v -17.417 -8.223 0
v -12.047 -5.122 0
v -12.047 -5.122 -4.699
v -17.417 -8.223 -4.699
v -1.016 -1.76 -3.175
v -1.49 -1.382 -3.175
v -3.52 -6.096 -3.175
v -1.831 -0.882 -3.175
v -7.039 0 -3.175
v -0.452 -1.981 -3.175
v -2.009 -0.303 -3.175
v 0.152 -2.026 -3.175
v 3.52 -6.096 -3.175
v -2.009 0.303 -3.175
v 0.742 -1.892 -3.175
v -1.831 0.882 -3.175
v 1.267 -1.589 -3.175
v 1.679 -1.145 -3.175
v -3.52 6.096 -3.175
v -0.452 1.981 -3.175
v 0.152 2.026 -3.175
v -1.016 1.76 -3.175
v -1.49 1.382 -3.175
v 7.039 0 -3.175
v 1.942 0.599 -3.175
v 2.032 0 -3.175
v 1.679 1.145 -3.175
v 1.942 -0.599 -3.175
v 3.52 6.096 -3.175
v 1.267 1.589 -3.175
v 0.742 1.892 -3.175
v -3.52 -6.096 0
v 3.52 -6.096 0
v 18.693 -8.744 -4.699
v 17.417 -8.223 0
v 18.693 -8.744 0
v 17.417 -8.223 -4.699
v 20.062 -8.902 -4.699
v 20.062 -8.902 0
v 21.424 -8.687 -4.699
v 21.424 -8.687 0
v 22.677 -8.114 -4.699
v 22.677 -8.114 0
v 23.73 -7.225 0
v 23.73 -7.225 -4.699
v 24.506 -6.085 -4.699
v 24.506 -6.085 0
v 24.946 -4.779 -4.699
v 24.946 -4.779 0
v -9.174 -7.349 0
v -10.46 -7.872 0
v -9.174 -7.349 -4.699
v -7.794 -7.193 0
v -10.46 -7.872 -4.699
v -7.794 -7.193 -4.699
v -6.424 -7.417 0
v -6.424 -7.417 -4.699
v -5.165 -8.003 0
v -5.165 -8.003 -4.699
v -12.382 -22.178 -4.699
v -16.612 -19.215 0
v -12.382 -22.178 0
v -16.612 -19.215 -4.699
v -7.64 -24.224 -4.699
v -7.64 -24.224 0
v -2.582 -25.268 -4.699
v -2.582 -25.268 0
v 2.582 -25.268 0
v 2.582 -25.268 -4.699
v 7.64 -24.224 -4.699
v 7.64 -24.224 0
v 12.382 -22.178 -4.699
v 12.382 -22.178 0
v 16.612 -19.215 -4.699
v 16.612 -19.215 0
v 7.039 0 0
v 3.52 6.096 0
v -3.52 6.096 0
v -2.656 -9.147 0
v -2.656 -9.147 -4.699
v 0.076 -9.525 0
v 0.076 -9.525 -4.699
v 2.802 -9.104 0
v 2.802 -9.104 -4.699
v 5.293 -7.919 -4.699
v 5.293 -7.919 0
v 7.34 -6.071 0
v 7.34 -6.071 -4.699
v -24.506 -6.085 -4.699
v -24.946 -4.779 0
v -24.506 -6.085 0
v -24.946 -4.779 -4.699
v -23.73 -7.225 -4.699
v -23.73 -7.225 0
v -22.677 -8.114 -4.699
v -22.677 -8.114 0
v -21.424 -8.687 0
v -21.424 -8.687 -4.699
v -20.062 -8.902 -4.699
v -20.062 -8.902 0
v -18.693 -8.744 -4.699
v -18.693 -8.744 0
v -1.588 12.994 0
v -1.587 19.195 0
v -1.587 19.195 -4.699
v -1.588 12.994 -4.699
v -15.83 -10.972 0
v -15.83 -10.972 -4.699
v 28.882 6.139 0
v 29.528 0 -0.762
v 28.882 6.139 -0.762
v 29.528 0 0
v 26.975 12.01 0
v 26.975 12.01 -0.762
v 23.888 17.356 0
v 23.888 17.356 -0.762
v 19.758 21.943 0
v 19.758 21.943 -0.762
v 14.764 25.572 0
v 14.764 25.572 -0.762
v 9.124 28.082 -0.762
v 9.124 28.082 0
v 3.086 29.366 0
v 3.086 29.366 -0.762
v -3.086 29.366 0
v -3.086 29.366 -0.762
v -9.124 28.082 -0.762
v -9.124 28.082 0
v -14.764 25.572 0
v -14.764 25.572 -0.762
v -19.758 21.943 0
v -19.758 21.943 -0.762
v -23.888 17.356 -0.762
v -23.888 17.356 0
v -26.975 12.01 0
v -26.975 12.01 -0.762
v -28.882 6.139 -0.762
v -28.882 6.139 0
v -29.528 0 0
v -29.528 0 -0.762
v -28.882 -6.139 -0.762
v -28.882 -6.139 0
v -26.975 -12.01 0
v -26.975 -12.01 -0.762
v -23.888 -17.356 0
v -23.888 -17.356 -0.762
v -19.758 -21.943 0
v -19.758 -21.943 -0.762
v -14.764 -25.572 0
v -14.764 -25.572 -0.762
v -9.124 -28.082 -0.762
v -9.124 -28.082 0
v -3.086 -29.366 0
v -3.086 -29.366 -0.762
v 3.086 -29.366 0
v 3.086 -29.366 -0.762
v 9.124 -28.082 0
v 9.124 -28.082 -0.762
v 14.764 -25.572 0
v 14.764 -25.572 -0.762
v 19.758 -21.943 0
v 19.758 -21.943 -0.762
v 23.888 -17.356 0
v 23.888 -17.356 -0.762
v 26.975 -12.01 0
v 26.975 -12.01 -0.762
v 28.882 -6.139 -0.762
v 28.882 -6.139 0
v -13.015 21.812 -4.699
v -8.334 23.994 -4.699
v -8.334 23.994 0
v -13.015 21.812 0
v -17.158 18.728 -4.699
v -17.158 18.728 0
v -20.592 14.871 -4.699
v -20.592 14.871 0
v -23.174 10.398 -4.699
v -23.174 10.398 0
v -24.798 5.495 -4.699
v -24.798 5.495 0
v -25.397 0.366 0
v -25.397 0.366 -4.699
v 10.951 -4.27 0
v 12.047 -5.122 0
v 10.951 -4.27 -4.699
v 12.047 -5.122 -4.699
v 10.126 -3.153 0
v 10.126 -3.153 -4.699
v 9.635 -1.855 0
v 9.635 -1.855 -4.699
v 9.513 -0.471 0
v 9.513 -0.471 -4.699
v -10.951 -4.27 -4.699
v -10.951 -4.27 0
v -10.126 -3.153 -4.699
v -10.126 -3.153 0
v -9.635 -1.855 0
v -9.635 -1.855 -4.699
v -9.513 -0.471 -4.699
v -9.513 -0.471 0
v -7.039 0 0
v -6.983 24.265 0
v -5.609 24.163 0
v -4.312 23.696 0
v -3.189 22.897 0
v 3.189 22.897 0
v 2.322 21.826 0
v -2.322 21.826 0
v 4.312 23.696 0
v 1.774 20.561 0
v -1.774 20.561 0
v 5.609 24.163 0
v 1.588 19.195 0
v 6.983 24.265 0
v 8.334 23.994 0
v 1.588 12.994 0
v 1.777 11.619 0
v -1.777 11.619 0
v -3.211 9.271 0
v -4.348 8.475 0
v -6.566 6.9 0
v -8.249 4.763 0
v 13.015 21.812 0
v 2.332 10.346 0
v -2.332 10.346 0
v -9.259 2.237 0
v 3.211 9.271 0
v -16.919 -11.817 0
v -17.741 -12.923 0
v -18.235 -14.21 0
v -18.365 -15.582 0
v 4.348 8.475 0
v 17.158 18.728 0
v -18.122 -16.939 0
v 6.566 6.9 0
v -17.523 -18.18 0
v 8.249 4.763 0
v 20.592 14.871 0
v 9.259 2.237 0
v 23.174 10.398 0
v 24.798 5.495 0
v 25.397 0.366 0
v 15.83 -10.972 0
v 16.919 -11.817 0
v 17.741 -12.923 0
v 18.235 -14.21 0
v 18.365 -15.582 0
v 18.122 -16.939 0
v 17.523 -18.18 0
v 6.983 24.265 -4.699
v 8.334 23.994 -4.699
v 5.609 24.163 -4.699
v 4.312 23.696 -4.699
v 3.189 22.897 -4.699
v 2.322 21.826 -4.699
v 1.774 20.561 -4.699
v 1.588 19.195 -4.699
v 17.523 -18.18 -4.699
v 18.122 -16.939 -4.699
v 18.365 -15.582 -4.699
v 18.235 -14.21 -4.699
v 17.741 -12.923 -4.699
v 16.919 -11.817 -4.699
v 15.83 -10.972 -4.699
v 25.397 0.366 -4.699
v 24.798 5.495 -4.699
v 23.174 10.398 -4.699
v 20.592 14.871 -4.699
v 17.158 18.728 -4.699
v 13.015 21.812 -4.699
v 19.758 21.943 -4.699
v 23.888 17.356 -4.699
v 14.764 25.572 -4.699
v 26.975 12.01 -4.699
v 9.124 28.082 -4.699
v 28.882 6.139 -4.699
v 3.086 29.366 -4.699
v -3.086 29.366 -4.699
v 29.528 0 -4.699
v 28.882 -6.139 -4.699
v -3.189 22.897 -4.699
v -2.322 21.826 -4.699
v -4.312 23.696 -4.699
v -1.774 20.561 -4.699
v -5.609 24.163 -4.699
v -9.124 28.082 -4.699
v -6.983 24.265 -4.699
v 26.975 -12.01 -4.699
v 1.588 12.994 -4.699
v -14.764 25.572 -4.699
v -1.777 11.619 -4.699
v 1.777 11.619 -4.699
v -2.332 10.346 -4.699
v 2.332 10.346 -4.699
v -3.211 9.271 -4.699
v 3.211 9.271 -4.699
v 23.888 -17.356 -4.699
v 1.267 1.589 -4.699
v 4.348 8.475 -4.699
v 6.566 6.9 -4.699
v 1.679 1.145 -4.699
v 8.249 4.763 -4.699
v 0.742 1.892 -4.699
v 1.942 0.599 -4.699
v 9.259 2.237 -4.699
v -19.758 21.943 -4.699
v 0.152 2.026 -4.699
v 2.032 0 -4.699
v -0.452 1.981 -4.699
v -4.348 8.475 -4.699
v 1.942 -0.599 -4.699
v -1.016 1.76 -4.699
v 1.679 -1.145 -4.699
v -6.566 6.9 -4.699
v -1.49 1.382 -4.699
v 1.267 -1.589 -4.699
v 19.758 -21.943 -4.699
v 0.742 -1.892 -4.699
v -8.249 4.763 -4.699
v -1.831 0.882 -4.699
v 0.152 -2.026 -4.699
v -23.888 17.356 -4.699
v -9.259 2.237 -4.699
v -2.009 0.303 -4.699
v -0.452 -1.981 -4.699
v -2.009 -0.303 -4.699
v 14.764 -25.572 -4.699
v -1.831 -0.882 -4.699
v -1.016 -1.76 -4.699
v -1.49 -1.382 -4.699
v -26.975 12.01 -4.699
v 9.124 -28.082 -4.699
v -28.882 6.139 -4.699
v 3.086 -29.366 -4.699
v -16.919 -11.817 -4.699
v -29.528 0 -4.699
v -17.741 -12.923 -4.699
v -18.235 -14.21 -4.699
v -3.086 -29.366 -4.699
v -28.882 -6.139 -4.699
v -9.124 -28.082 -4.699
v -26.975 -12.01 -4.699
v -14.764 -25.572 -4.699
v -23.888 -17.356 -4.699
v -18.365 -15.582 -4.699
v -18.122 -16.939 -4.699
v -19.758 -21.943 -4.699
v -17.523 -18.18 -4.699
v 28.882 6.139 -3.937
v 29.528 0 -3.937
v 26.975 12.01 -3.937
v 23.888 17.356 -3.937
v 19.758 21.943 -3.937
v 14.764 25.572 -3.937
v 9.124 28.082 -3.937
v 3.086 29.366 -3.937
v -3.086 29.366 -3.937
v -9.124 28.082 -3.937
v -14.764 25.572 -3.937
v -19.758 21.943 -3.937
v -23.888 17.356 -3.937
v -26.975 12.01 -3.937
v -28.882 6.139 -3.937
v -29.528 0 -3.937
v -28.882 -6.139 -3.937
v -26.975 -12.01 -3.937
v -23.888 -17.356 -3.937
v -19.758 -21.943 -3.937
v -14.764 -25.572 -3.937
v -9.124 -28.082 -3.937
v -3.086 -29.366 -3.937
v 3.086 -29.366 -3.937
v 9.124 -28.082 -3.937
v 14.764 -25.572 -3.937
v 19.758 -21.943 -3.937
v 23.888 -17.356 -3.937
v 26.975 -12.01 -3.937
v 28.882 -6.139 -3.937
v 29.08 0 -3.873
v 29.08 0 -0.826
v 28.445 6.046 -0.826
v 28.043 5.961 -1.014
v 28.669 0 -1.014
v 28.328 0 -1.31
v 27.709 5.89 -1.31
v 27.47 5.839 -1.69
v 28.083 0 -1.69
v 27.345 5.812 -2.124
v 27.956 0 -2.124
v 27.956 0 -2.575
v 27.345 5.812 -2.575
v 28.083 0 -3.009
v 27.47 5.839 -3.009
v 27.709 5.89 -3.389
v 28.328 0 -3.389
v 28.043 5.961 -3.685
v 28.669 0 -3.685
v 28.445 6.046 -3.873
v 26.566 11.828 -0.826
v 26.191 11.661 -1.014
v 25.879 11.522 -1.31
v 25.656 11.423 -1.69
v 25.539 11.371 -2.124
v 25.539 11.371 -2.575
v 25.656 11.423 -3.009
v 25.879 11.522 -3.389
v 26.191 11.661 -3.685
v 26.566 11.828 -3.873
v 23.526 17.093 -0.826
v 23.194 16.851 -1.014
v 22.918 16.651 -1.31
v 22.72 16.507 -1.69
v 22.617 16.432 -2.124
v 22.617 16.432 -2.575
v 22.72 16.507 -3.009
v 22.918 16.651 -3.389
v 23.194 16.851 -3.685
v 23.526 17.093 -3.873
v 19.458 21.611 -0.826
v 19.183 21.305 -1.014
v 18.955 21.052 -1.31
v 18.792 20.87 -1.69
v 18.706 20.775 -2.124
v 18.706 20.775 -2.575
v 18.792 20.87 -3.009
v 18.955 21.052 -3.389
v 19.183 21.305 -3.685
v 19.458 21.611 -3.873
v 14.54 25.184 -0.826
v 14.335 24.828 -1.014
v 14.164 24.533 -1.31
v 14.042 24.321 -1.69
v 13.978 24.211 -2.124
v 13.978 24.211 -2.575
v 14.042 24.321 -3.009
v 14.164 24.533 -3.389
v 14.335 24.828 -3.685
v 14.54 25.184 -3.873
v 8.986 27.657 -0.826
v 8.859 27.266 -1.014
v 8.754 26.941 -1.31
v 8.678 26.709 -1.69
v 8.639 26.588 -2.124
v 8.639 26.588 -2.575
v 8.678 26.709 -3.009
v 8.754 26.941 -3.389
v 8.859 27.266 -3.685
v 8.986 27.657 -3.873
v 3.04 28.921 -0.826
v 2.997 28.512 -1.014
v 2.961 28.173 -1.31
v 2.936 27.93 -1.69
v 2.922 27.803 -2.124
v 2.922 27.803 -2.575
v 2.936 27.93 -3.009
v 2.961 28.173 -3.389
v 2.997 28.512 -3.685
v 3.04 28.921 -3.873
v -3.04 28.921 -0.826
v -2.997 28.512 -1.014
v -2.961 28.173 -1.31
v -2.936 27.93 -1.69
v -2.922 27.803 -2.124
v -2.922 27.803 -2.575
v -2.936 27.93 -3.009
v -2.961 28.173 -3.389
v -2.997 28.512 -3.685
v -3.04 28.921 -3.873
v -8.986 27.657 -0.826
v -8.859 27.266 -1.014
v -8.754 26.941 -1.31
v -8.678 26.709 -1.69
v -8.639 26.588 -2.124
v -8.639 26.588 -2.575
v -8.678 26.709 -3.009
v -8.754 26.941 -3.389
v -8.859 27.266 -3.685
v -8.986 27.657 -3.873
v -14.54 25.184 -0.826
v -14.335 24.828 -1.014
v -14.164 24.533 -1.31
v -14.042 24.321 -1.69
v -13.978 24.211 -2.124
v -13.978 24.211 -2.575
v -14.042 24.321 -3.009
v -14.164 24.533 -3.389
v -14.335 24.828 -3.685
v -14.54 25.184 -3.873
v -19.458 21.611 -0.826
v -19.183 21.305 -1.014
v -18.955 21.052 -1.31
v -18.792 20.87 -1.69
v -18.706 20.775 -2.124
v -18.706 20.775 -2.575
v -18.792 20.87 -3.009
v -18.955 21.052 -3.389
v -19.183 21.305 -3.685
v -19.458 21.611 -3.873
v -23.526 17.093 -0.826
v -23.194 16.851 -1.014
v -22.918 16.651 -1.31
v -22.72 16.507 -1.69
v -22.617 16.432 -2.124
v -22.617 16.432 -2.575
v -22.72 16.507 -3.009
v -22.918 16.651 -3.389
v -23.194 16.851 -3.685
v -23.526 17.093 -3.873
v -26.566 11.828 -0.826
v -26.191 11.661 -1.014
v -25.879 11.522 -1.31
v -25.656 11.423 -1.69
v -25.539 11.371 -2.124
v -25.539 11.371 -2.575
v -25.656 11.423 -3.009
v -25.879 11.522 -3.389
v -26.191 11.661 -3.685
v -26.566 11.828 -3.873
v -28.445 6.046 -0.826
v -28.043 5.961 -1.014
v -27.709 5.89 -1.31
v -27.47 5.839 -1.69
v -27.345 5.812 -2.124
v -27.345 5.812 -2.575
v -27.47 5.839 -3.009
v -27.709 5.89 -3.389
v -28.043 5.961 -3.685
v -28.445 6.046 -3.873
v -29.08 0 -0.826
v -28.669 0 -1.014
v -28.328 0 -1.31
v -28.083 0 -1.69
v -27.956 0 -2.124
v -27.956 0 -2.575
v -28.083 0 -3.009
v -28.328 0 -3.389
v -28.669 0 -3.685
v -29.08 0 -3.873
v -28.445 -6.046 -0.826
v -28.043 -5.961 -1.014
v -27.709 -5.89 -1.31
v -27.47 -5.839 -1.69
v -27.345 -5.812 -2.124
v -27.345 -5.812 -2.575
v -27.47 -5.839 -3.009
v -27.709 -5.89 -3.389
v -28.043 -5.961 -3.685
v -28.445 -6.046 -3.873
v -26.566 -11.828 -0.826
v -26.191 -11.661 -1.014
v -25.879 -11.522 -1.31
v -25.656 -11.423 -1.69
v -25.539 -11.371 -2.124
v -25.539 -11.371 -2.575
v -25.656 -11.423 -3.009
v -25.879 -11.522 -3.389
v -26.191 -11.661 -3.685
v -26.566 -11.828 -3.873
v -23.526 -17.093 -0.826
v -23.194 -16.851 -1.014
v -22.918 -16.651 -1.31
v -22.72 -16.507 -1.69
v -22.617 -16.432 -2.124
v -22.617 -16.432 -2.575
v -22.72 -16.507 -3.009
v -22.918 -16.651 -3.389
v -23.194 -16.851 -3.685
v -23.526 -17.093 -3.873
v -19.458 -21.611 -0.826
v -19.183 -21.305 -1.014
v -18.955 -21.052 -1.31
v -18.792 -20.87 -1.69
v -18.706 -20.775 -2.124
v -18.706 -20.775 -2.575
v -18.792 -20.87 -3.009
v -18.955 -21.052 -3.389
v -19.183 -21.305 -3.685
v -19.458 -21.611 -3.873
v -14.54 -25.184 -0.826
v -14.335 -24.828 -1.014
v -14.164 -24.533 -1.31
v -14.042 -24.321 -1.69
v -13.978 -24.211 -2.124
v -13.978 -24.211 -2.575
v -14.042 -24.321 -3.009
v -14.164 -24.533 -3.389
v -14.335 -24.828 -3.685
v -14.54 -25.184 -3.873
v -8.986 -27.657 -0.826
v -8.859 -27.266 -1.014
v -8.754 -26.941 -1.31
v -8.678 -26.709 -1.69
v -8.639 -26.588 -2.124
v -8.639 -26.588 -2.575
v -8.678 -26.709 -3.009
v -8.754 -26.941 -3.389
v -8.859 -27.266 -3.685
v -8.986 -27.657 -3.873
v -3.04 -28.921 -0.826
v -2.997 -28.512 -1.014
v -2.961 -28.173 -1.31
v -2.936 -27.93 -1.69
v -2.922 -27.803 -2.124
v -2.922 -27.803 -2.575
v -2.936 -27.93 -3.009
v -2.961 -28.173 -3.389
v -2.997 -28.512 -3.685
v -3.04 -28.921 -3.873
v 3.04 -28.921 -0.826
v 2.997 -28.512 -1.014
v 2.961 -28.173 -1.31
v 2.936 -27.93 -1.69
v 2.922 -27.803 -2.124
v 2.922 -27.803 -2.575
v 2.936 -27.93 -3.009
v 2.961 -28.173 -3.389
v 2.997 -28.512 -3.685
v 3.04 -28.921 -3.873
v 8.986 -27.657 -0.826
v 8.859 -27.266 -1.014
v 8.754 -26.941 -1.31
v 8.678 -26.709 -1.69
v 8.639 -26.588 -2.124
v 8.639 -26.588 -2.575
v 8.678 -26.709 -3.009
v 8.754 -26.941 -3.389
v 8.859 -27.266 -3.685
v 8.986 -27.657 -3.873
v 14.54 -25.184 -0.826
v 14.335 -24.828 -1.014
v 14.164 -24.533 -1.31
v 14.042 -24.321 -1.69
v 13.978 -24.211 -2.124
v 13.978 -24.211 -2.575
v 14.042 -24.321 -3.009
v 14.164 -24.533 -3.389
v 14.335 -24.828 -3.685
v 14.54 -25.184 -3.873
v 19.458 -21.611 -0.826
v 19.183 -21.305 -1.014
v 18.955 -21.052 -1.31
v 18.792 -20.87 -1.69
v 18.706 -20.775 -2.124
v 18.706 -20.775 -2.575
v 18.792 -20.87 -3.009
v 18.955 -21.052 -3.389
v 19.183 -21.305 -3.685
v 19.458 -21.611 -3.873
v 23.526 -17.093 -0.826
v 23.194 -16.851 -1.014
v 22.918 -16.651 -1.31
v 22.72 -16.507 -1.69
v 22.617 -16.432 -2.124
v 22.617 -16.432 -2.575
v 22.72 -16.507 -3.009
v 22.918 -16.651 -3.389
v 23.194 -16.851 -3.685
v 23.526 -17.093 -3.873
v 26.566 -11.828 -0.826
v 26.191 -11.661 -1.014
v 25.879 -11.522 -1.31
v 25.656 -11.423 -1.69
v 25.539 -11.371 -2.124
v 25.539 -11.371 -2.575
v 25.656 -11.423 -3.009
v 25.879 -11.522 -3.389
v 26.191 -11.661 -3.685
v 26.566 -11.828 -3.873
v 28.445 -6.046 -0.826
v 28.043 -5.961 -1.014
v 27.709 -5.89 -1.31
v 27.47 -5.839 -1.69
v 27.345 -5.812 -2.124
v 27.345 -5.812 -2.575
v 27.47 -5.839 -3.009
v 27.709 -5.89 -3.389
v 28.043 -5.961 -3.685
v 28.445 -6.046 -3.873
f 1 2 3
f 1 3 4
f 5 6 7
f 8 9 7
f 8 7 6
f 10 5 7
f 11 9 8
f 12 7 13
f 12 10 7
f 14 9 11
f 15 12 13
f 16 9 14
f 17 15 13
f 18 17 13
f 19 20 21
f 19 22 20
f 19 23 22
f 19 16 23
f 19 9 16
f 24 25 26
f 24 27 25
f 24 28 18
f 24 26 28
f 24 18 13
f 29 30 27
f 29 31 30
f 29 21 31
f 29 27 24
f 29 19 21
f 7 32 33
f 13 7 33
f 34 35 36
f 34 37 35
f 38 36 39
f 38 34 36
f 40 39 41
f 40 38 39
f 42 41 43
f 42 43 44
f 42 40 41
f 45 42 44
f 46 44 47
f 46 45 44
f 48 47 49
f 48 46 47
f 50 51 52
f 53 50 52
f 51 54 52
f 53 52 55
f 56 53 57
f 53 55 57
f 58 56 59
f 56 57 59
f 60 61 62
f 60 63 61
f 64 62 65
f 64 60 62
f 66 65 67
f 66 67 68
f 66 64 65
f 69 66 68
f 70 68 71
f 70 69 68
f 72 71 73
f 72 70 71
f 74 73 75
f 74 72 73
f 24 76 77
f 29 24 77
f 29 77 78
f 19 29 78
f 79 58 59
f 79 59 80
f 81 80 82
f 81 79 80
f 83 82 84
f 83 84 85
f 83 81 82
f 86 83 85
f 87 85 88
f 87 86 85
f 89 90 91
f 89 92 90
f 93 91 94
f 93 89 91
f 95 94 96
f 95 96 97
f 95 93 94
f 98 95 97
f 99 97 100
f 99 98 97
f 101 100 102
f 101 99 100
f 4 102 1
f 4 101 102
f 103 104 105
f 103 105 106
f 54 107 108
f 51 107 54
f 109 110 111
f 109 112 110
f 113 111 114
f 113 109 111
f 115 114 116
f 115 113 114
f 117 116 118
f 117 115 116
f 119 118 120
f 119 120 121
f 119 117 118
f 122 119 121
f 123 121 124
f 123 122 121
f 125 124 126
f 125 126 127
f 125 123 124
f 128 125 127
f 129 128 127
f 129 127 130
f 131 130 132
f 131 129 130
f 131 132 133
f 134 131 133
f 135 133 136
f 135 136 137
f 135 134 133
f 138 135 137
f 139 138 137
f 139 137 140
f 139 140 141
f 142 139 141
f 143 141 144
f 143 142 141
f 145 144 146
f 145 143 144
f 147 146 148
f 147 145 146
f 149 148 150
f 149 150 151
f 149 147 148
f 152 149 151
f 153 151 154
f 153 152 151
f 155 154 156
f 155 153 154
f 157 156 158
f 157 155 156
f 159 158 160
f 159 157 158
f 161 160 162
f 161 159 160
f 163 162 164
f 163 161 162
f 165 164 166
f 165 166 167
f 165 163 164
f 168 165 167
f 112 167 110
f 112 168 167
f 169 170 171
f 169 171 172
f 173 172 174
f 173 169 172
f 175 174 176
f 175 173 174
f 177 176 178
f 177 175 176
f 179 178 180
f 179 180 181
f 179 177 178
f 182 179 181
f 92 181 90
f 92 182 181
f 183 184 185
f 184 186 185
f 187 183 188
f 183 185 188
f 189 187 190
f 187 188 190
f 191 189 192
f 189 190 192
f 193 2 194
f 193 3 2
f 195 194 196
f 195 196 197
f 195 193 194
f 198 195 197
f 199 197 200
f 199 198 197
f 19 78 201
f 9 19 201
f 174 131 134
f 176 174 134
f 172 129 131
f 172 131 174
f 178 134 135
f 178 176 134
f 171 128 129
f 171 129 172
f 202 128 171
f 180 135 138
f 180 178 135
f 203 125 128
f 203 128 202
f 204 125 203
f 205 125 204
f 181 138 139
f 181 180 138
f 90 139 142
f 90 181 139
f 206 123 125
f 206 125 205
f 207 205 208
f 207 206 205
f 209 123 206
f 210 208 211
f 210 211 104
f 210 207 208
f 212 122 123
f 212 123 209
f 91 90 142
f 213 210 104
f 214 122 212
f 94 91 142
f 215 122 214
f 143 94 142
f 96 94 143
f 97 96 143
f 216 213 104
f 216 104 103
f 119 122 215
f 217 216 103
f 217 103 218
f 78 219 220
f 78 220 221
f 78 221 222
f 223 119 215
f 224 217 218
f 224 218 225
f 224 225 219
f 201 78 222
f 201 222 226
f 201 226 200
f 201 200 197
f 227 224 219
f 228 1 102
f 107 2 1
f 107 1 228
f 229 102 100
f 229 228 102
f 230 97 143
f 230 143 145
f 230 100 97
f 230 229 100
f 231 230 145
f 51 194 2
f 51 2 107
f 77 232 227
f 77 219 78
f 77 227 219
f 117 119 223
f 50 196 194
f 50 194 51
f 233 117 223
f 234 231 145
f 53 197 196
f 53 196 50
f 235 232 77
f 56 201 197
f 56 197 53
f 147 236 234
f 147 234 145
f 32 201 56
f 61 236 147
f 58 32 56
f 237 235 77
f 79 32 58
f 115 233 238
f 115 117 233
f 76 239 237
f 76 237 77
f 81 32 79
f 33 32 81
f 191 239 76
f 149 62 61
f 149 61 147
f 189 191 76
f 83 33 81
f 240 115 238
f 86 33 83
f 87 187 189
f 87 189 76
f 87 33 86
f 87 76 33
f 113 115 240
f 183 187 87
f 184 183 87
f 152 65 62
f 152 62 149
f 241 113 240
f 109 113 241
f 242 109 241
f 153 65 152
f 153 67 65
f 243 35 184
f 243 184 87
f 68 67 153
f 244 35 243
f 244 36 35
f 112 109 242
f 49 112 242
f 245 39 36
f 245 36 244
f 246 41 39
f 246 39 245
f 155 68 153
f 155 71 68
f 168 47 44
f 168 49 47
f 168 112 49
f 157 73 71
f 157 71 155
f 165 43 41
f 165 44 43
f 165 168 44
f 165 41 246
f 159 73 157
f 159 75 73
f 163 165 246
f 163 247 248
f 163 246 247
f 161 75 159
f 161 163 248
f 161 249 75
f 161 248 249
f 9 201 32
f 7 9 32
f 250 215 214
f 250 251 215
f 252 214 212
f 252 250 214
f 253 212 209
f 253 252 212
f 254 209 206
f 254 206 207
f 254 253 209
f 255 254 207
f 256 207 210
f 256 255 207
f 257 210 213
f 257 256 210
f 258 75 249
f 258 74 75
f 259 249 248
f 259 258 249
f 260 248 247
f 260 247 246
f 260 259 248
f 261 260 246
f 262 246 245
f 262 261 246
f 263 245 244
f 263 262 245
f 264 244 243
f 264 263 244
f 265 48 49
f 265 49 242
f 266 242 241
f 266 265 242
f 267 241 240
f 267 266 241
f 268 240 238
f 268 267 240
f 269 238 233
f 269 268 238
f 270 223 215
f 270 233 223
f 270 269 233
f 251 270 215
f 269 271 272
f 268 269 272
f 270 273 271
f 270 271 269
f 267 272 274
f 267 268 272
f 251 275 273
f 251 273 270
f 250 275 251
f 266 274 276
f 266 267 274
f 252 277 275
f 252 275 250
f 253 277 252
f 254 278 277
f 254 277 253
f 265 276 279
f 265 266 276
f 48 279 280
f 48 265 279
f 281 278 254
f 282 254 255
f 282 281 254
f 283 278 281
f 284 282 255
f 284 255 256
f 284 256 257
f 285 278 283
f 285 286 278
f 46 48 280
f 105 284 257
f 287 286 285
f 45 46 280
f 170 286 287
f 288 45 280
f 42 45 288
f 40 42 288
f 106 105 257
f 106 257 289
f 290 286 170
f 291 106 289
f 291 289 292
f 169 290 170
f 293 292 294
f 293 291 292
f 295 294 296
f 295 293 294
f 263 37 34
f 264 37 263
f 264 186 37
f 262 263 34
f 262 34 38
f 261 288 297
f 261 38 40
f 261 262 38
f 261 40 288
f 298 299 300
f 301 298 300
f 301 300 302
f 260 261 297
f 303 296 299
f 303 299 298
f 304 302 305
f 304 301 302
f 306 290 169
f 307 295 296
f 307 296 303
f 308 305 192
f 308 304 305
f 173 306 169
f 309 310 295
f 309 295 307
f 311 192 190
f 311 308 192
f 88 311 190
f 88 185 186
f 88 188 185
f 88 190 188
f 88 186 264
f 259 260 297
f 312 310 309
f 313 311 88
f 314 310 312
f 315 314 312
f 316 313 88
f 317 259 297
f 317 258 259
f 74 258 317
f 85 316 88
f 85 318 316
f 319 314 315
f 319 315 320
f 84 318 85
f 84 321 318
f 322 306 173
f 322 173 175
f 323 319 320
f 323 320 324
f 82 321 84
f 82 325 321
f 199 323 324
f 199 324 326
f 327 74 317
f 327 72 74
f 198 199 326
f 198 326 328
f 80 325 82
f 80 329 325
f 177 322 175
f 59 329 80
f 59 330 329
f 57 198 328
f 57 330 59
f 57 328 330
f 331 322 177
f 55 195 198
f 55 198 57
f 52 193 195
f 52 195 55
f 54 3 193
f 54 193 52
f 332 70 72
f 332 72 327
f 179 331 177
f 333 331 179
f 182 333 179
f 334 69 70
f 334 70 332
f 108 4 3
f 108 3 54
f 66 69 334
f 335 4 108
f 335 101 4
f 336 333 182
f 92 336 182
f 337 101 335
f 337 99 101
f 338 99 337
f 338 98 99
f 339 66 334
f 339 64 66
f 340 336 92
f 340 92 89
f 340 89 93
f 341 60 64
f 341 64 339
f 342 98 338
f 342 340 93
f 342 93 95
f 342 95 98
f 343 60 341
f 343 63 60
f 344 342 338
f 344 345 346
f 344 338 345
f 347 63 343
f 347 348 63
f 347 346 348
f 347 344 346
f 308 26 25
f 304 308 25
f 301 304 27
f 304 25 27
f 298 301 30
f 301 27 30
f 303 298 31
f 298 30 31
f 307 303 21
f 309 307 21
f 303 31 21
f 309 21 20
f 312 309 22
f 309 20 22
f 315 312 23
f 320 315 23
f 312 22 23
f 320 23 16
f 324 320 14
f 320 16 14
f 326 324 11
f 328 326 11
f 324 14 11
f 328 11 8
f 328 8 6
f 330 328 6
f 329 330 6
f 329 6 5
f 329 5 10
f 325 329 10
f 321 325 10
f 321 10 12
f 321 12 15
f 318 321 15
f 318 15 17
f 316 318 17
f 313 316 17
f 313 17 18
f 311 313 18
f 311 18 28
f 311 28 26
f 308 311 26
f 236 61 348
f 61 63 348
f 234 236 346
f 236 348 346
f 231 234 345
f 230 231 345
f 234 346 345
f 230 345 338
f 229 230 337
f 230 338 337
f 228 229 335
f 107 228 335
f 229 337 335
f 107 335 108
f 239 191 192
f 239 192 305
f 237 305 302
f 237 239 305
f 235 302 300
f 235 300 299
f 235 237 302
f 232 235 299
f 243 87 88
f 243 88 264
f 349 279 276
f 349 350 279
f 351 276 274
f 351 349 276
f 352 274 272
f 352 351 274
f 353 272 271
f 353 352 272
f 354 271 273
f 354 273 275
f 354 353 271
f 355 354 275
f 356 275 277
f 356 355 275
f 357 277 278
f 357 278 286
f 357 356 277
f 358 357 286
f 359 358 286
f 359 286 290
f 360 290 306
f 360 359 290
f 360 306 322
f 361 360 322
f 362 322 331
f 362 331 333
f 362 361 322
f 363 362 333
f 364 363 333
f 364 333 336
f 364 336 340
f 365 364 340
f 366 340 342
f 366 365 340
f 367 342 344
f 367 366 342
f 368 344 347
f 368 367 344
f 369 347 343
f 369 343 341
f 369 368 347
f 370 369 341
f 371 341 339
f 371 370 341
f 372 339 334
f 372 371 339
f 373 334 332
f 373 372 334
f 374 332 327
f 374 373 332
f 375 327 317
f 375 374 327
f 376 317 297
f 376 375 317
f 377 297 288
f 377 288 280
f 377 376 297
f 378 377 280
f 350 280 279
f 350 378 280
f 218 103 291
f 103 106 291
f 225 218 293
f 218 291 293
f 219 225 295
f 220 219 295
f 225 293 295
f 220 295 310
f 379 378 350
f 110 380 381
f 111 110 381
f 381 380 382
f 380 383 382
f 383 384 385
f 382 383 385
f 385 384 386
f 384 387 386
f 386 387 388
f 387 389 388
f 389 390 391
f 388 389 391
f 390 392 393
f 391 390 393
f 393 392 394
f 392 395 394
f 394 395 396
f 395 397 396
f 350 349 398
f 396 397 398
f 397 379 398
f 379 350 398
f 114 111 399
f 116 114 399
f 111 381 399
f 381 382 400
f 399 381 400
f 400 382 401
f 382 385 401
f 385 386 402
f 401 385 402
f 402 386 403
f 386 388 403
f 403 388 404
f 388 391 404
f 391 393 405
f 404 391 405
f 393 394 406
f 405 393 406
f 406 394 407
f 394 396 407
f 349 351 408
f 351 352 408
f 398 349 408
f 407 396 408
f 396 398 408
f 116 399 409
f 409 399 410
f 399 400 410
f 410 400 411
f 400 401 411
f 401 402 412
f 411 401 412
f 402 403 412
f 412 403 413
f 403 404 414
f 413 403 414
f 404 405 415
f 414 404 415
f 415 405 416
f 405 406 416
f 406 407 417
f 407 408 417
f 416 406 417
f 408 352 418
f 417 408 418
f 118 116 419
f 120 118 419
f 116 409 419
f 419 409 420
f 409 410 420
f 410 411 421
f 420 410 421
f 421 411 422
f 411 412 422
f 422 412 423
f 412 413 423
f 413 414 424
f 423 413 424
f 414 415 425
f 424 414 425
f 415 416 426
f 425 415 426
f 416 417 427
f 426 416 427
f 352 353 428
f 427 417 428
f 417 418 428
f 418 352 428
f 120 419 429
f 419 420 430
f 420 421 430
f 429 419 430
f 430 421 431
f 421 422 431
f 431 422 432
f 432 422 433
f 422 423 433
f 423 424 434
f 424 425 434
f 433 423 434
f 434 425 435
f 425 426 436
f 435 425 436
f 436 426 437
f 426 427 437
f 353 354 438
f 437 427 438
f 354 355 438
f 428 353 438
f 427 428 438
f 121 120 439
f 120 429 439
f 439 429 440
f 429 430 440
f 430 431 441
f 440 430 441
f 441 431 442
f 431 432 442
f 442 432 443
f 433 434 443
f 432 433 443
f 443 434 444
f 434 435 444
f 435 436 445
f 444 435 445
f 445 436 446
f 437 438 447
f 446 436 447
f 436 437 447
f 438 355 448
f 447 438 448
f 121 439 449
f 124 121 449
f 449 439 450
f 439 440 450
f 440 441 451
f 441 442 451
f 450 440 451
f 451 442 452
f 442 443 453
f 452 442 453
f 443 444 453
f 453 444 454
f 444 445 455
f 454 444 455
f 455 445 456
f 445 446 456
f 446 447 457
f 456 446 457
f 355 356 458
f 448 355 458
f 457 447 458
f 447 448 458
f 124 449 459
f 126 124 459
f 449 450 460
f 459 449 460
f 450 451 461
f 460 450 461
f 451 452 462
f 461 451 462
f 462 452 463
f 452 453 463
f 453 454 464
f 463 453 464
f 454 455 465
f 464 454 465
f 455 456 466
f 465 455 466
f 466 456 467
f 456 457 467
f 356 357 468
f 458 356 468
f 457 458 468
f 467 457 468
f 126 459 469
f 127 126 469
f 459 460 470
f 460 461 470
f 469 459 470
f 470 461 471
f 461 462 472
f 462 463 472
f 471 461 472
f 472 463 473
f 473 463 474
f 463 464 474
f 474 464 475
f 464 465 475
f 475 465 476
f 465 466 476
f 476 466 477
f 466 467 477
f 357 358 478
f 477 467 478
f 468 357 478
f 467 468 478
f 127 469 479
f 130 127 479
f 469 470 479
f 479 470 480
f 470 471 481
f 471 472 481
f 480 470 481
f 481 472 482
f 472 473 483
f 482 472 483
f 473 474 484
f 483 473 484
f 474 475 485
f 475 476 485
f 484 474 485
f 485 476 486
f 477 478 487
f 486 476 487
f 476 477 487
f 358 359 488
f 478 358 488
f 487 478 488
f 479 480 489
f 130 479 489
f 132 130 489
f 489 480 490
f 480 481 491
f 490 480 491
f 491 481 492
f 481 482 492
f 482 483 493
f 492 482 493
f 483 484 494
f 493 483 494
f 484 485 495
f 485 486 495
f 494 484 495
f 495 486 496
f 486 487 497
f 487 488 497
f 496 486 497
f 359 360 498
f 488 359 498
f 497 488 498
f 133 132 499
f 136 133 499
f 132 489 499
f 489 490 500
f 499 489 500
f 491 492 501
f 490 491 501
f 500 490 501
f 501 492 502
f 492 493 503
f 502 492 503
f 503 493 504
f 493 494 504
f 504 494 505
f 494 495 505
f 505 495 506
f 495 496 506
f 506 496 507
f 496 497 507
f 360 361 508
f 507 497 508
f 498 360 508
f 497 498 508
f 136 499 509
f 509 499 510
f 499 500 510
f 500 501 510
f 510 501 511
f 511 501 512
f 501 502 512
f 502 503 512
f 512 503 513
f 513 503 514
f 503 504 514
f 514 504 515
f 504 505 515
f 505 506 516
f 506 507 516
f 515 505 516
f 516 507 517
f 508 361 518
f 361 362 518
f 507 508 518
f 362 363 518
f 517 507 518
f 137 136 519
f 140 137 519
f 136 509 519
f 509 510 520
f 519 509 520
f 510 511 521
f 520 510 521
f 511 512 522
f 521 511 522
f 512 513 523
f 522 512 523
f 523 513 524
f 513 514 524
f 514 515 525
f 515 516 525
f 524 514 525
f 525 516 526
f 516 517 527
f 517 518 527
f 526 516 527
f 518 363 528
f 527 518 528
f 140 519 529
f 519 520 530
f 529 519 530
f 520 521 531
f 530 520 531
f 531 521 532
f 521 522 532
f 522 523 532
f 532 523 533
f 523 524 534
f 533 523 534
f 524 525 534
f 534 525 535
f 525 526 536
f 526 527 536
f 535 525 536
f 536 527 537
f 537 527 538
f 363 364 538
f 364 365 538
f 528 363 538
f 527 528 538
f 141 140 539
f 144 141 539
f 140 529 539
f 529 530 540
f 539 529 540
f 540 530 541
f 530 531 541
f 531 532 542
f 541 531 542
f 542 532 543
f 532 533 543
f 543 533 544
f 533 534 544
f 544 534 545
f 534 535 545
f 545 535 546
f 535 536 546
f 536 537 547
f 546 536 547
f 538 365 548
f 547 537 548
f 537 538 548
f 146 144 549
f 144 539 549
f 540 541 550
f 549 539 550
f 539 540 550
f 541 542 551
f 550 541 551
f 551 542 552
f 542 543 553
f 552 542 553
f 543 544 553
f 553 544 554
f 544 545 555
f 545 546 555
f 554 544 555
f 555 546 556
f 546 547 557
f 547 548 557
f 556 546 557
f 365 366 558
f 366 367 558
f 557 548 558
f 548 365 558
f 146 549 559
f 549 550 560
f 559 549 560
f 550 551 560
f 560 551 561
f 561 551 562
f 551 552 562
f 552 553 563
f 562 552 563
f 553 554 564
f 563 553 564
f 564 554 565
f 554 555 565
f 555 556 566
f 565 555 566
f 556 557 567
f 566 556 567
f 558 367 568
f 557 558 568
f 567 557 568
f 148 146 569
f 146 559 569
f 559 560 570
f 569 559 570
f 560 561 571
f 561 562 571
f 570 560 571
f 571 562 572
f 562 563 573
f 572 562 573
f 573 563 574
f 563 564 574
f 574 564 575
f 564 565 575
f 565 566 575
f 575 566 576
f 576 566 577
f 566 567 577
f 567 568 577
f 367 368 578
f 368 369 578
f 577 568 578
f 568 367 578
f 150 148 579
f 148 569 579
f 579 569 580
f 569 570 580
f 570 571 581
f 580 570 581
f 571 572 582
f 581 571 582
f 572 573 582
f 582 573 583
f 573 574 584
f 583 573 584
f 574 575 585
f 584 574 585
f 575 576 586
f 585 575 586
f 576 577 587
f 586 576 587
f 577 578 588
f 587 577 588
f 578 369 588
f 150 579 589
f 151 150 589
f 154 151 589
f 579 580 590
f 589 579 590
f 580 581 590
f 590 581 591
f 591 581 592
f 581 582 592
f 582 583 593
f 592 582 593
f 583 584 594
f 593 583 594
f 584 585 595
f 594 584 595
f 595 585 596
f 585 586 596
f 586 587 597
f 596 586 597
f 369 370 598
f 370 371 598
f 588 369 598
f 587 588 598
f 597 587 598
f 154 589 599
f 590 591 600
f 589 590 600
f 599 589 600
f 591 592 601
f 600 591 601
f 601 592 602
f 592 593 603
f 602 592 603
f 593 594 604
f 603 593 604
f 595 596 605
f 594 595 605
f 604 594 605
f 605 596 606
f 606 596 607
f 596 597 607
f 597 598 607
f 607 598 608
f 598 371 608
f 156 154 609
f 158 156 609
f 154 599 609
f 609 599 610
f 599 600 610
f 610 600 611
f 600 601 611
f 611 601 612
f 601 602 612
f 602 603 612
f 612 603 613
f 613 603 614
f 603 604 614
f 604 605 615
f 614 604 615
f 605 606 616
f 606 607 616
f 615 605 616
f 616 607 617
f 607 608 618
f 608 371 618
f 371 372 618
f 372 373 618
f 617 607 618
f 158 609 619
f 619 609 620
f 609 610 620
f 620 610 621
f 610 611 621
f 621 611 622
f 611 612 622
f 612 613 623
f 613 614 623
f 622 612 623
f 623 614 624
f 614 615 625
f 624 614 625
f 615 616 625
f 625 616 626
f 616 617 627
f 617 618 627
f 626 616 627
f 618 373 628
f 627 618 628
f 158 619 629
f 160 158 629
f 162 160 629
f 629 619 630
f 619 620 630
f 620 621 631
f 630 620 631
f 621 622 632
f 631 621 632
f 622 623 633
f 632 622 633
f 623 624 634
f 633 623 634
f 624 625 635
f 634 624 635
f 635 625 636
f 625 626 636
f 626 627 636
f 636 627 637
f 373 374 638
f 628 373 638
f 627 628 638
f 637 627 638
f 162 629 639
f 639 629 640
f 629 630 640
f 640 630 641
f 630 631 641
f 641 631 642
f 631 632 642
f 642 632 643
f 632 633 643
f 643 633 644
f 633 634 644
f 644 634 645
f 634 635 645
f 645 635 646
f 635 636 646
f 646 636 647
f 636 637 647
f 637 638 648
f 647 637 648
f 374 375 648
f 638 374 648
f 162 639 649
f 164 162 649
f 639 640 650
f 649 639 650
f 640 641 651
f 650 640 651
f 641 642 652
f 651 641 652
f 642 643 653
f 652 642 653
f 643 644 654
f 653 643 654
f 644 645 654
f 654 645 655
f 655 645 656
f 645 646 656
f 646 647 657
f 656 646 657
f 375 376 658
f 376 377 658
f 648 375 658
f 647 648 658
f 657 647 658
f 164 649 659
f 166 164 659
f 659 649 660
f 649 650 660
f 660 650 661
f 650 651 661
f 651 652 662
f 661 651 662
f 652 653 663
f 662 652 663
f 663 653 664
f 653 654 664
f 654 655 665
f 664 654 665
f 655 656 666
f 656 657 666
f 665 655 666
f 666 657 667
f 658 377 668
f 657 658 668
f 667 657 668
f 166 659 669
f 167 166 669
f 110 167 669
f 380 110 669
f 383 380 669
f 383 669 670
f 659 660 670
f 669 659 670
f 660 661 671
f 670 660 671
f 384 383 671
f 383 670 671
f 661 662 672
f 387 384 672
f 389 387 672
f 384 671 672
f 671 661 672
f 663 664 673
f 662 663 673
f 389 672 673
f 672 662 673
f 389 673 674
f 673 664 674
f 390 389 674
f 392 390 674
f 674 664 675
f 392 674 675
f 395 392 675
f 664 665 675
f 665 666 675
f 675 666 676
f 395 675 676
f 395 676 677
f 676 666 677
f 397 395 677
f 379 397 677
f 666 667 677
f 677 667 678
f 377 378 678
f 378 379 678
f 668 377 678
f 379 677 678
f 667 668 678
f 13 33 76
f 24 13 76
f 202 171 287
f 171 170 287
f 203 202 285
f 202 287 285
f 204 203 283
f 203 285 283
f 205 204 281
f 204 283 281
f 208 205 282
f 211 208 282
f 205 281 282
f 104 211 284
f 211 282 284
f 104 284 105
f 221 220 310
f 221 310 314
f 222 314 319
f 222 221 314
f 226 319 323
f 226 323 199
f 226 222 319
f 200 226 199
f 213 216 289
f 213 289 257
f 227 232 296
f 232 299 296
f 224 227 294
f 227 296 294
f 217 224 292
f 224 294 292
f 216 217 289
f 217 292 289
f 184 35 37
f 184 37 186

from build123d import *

# Parameters (mm, degrees)
SKETCH1_R           = 9.525
BOSS_EXTRUDE1_DEPTH = 4.699
CUT_EXTRUDE1_DEPTH  = 3.175
SKETCH5_R           = 2.032
CUT_EXTRUDE2_DEPTH  = 43.021745862
FILLET1_R           = 5.08


with BuildPart() as part:
    # Sketch1 → Boss-Extrude1 (new body)
    with BuildSketch(Plane.XY):
        with BuildLine():
            ThreePointArc((1.5875, 25.350342083), (0, 25.4), (-1.5875, 25.350342083))
            Line((-1.5875, 25.350342083), (-1.5875, 9.391776656))
            ThreePointArc((-1.5875, 9.391776656), (0, 9.525), (1.5875, 9.391776656))
            Line((1.5875, 9.391776656), (1.5875, 25.350342083))
        make_face()
        Circle(SKETCH1_R)
        with BuildLine():
            ThreePointArc((21.160290239, -14.04998637), (21.997045256, -12.7), (22.747790239, -11.300355713))
            Line((22.747790239, -11.300355713), (8.92726717, -3.321072999))
            ThreePointArc((8.92726717, -3.321072999), (8.248891971, -4.7625), (7.33976717, -6.070703656))
            Line((7.33976717, -6.070703656), (21.160290239, -14.04998637))
        make_face()
        with BuildLine():
            Line((-8.92726717, -3.321072999), (-22.747790239, -11.300355713))
            ThreePointArc((-22.747790239, -11.300355713), (-21.997045256, -12.7), (-21.160290239, -14.04998637))
            Line((-21.160290239, -14.04998637), (-7.33976717, -6.070703656))
            ThreePointArc((-7.33976717, -6.070703656), (-8.248891971, -4.7625), (-8.92726717, -3.321072999))
        make_face()
    extrude(amount=-BOSS_EXTRUDE1_DEPTH)

    # Sweep1: sweep along a path in Sketch4
    with BuildLine(Plane.XY) as sweep1_path:
        CenterArc((0, 0), 25.4, 0, 360)
    # Sketch3 → Sweep1 (sweep)
    with BuildSketch(Plane(origin=(0, 0, 0), x_dir=(0, 0, -1), z_dir=(1, 0, 0))):
        with BuildLine():
            Line((0, 25.4), (0, 29.5275))
            Line((0, 29.5275), (0.762, 29.5275))
            ThreePointArc((0.762, 29.5275), (2.3495, 27.94), (3.937, 29.5275))
            Line((3.937, 29.5275), (4.699, 29.5275))
            Line((4.699, 29.5275), (4.699, 25.4))
            Line((4.699, 25.4), (0, 25.4))
        make_face()
    sweep(path=sweep1_path.line)

    # Sketch2 → Cut-Extrude1 (cut)
    with BuildSketch(Plane.XY):
        Polygon((7.039054482, 0), (3.519527241, 6.096), (-3.519527241, 6.096), (-7.039054482, 0), (-3.519527241, -6.096), (3.519527241, -6.096), align=None)
    extrude(amount=-CUT_EXTRUDE1_DEPTH, mode=Mode.SUBTRACT)

    # Sketch5 → Cut-Extrude2 (cut, through all)
    with BuildSketch(Plane.XY):
        Circle(SKETCH5_R)
    extrude(amount=-CUT_EXTRUDE2_DEPTH, mode=Mode.SUBTRACT)

    # Fillet1
    fillet1_edges = [part.edges().sort_by_distance(p)[0] for p in [
        (-1.5875, 25.350342083, -2.3495),
        (1.5875, 25.350342083, -2.3495),
        (1.5875, 9.391776656, -2.3495),
        (8.92726717, -3.321072999, -2.3495),
        (22.747790239, -11.300355713, -2.3495),
        (21.160290239, -14.04998637, -2.3495),
        (-7.33976717, -6.070703656, -2.3495),
        (-21.160290239, -14.04998637, -2.3495),
        (-22.747790239, -11.300355713, -2.3495),
        (-8.92726717, -3.321072999, -2.3495),
        (-1.5875, 9.391776656, -2.3495),
    ]]
    fillet(fillet1_edges, radius=FILLET1_R)


solid = part.part
